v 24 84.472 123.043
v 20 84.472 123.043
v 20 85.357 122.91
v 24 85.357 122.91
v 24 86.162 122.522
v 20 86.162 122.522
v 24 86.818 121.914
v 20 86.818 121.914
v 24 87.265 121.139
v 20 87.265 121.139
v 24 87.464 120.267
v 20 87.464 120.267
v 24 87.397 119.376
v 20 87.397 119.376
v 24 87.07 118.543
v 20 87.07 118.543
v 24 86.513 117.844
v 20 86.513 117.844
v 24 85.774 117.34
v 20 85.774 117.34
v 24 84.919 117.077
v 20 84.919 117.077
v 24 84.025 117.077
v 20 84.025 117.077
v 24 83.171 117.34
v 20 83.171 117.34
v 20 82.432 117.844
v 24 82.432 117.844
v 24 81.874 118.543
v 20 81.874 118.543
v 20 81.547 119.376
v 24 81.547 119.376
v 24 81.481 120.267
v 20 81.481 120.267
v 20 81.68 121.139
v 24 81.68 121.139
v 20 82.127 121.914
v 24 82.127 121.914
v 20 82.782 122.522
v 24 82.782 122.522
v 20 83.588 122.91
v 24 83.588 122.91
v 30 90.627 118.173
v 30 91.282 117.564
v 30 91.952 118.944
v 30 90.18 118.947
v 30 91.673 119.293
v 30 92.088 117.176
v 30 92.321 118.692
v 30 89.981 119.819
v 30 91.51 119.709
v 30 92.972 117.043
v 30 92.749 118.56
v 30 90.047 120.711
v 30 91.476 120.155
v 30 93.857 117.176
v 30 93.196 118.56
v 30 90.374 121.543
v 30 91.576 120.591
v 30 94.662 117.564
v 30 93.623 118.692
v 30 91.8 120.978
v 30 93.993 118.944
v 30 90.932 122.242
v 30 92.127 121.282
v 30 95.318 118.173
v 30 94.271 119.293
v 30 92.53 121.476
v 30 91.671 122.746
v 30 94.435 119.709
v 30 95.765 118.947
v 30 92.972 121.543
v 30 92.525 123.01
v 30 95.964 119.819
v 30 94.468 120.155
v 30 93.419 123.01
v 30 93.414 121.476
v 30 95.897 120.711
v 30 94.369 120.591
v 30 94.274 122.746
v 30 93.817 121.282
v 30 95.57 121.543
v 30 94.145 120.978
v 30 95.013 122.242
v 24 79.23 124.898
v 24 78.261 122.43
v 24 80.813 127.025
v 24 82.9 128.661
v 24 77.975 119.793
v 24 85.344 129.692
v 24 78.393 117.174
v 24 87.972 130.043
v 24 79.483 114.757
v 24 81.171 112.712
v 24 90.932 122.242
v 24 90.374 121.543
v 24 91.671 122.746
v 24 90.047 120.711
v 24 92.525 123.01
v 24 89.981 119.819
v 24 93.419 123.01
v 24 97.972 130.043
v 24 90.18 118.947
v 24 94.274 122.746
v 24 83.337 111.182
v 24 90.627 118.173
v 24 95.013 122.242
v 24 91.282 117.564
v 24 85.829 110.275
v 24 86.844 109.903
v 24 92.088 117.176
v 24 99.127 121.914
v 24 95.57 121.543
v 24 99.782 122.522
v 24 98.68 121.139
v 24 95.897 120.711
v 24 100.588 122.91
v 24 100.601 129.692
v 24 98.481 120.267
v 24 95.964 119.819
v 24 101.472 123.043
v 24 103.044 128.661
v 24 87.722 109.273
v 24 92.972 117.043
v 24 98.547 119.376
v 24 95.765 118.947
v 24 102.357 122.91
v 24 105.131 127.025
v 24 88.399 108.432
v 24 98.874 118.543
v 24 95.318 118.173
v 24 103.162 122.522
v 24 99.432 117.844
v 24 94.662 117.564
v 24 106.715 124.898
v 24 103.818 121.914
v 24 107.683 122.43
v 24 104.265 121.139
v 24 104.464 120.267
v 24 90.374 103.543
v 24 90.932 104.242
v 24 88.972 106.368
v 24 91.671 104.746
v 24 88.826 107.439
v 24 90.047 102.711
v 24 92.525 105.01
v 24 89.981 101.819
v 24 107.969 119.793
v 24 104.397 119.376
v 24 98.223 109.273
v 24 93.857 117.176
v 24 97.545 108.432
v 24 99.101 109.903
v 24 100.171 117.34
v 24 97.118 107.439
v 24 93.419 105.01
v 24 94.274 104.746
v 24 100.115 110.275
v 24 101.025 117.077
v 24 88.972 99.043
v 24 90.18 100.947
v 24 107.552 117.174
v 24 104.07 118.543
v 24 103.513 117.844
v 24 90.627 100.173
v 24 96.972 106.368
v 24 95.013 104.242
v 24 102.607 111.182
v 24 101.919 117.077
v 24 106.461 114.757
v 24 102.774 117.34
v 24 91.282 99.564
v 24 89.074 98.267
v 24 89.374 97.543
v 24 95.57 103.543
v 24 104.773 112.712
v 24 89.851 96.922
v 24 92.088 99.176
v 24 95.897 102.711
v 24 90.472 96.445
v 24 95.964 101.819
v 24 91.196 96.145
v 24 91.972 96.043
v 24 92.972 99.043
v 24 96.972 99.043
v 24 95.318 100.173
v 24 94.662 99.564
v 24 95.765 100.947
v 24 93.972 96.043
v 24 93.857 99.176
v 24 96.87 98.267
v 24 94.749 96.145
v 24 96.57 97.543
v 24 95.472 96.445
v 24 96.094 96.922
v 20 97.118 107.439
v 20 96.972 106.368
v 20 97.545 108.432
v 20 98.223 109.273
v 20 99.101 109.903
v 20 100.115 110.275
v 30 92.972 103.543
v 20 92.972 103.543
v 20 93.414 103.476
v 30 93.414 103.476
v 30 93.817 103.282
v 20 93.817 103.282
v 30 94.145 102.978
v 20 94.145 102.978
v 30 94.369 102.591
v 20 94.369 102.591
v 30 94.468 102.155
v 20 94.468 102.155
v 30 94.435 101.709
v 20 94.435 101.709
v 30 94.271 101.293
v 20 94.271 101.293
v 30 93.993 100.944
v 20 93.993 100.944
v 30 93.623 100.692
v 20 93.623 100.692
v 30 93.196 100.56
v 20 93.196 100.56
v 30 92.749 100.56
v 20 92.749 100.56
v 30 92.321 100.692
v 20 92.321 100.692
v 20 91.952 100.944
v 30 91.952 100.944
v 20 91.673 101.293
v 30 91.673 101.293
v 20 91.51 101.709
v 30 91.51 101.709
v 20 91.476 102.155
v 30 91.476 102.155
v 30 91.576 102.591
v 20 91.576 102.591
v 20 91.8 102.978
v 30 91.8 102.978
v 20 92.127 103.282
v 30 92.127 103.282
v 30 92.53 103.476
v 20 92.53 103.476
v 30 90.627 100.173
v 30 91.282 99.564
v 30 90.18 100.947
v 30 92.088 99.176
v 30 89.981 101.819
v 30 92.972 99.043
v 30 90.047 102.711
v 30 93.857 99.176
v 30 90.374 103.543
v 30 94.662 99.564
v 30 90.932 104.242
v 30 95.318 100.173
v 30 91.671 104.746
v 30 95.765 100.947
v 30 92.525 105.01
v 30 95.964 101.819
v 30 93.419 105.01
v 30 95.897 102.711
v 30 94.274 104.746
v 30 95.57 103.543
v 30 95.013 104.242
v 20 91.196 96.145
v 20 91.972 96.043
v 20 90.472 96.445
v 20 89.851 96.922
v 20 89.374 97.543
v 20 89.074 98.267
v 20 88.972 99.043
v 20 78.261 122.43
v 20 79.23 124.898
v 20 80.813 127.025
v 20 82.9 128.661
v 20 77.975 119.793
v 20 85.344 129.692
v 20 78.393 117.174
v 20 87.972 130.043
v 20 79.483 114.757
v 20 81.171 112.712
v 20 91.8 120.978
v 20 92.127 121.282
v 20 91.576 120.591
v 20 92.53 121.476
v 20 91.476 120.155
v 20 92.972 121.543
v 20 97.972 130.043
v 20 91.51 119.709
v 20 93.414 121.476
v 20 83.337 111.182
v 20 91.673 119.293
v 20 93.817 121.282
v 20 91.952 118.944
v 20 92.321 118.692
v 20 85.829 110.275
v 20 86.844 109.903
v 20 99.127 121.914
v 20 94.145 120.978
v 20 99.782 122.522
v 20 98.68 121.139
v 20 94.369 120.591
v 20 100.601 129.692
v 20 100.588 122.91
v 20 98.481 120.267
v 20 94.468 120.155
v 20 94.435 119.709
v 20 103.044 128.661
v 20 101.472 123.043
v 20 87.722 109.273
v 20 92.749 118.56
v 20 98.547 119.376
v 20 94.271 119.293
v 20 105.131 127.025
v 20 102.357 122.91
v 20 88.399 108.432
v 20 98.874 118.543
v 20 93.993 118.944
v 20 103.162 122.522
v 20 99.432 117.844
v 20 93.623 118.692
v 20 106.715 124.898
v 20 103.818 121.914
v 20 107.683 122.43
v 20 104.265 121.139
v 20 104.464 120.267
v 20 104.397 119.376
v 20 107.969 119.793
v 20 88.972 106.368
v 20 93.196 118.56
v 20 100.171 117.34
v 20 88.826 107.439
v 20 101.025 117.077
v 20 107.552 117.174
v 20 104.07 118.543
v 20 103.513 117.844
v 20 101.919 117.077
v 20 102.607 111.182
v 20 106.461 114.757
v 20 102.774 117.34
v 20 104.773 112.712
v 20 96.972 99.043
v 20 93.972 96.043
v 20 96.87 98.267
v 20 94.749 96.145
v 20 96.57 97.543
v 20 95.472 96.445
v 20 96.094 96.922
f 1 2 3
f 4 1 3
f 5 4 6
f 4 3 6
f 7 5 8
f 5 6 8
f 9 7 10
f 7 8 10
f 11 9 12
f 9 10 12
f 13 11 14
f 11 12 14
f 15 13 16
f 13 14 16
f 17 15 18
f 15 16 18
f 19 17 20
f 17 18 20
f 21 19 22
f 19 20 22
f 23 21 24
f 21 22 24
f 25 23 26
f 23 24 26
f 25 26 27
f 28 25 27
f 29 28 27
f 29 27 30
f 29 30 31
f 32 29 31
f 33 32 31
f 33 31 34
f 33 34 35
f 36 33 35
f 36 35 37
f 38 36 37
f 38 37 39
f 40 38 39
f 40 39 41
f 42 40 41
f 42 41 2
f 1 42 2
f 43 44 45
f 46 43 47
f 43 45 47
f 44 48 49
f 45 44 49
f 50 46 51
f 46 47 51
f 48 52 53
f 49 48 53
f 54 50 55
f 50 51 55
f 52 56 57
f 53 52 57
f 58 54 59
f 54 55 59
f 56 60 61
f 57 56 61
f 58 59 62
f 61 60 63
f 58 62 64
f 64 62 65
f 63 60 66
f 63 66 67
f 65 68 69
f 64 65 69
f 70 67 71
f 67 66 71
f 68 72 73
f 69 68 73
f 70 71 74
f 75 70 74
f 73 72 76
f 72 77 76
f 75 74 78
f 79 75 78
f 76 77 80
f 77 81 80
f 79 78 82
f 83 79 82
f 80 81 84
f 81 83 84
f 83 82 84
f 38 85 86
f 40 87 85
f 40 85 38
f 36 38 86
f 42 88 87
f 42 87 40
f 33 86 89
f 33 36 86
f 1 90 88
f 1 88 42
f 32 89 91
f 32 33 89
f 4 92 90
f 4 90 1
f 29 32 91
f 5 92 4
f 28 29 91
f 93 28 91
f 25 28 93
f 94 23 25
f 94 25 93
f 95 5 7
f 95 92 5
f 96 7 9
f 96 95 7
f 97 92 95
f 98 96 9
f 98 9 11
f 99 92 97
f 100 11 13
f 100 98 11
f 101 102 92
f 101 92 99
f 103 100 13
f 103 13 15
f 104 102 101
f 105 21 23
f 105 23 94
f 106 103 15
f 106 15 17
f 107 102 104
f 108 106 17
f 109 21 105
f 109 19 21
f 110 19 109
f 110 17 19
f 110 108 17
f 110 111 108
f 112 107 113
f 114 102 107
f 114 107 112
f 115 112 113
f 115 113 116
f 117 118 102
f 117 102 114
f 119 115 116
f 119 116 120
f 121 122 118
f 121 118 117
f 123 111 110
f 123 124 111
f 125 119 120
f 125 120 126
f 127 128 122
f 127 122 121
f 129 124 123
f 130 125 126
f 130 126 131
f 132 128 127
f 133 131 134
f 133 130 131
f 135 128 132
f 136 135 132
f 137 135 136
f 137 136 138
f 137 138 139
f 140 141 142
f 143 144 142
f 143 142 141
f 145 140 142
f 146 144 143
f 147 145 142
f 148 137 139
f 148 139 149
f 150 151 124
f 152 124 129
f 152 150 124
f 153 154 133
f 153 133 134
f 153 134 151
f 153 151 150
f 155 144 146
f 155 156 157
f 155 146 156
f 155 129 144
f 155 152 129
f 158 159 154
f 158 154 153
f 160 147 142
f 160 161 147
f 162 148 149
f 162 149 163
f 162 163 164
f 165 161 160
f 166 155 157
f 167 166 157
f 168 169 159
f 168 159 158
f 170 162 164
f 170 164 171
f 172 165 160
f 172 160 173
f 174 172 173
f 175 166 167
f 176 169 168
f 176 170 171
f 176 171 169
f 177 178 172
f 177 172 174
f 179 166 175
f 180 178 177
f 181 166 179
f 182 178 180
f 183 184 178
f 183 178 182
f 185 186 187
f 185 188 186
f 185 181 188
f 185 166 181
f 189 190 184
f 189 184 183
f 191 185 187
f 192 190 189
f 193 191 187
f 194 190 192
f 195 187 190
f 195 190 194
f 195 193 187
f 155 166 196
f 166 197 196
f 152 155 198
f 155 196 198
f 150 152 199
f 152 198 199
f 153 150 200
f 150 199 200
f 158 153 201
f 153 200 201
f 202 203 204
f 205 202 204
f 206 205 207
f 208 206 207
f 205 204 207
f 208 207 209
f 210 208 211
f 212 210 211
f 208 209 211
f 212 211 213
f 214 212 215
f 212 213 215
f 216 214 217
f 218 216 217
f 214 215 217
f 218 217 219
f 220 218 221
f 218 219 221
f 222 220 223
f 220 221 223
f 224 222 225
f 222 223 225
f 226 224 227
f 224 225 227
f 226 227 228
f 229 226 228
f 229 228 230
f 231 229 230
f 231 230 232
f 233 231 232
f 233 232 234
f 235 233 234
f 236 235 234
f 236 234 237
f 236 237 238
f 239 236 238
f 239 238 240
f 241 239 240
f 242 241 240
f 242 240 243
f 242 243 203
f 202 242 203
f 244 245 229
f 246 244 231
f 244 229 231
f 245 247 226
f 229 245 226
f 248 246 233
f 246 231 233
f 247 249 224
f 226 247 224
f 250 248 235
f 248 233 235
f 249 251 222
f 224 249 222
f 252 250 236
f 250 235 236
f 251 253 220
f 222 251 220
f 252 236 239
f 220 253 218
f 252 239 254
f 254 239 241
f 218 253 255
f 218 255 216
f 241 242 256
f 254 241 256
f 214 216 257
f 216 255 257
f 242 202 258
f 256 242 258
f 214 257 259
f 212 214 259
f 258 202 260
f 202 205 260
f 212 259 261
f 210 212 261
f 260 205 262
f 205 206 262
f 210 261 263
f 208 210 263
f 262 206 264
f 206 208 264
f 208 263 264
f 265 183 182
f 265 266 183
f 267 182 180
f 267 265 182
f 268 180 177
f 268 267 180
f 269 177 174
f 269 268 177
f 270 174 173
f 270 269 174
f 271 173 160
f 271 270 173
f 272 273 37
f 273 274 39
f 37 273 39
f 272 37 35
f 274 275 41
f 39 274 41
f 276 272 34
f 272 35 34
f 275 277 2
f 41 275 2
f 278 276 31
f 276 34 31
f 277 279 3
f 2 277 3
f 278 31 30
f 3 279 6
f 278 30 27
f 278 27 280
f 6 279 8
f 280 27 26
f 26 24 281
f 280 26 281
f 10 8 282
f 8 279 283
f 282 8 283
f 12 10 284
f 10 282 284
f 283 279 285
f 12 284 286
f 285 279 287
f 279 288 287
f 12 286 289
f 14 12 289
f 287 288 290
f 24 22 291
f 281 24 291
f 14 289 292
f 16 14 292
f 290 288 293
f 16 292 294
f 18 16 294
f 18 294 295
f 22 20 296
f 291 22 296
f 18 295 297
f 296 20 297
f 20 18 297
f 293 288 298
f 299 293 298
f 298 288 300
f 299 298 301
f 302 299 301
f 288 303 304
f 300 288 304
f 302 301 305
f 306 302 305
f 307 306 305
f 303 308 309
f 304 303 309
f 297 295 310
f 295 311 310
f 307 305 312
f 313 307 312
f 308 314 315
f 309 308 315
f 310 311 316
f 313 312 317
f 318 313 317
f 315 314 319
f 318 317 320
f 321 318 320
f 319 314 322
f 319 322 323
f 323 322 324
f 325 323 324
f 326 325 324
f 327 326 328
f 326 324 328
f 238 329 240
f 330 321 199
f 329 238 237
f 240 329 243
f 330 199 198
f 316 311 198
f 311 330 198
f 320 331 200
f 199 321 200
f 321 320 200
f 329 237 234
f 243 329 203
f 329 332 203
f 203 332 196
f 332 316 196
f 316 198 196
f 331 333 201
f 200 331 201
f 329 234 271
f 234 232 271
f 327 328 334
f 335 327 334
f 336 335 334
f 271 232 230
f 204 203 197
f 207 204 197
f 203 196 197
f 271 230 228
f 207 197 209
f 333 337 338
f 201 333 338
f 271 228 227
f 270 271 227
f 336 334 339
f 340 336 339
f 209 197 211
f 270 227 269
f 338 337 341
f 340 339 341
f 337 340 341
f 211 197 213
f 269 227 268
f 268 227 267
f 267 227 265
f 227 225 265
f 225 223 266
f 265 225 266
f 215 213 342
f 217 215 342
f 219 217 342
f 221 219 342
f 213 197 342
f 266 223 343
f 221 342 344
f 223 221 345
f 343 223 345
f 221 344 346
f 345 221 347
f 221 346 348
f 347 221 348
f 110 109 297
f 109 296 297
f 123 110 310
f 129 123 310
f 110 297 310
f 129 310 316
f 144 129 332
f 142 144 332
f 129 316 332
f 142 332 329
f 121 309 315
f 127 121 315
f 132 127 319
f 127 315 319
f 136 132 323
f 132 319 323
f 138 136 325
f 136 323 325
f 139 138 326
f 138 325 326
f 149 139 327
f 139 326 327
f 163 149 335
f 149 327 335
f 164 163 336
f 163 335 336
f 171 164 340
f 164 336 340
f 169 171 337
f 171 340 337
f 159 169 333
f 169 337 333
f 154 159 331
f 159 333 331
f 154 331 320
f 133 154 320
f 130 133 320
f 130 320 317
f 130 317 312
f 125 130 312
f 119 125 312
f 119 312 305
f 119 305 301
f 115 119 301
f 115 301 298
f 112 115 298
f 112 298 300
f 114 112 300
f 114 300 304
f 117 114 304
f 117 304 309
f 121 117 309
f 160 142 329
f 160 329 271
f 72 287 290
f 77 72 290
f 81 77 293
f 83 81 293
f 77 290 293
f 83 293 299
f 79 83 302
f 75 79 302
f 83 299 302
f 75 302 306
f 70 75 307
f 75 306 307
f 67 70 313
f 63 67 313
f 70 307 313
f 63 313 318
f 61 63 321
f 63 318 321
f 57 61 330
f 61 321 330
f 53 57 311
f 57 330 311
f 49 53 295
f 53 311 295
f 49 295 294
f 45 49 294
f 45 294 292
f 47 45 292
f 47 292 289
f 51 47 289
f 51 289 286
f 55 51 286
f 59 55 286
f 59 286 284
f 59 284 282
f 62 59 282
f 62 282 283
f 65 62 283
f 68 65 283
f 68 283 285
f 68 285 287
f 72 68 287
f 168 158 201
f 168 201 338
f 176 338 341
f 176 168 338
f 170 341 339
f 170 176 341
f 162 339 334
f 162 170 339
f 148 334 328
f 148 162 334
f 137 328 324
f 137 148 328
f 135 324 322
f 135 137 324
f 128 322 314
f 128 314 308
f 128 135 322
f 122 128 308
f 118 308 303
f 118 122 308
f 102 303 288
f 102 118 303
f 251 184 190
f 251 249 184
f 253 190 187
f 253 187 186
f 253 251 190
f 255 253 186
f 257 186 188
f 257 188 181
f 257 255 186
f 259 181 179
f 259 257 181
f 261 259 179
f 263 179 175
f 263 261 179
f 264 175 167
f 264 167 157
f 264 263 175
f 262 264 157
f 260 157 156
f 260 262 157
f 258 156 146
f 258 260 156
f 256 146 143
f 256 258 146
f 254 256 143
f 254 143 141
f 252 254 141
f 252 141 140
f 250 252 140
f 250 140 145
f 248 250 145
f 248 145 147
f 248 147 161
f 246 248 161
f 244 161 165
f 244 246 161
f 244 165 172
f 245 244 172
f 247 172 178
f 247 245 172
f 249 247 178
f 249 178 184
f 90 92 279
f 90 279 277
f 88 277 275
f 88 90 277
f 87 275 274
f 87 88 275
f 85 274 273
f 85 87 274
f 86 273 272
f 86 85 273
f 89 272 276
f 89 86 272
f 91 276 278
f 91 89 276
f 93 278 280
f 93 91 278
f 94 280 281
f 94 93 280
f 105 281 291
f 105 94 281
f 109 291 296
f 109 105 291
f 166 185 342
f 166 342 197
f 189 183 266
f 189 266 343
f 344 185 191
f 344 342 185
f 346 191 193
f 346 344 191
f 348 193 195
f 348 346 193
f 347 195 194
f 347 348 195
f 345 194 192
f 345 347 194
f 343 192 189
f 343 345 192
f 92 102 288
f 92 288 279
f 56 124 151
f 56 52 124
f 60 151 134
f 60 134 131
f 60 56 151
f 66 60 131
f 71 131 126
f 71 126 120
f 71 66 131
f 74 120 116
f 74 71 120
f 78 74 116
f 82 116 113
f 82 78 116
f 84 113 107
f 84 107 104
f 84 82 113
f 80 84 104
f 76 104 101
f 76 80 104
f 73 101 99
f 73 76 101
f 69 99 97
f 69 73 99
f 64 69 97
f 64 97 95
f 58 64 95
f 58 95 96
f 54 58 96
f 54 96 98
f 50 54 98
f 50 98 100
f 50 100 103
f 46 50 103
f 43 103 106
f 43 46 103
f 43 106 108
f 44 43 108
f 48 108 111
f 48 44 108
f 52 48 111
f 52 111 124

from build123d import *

# Parameters (mm, degrees)
BOSS_EXTRUDE1_DEPTH      = 4
SKETCH2_W                = 6
SKETCH2_H                = 3
SKETCH3_W                = 6
SKETCH3_H                = 3
F_3_0_3_DIAMETER_HOLE1_D = 3
F_6_0_6_DIAMETER_HOLE1_D = 6
FILLET1_R                = 3
FILLET2_R                = 4


with BuildPart() as part:
    # Sketch1 → Boss-Extrude1 (new body)
    with BuildSketch(Plane(origin=(24, 0, 0), x_dir=(0, 0, -1), z_dir=(1, 0, 0))):
        with BuildLine():
            Line((-96.043137062, 96.972273827), (-110.093262691, 96.972273827))
            ThreePointArc((-110.093262691, 96.972273827), (-119.542509311, 107.959734558), (-130.043137062, 97.972273827))
            Line((-130.043137062, 97.972273827), (-130.043137062, 87.972273827))
            ThreePointArc((-130.043137062, 87.972273827), (-119.542509311, 77.984813095), (-110.093262691, 88.972273827))
            Line((-110.093262691, 88.972273827), (-96.043137062, 88.972273827))
            Line((-96.043137062, 88.972273827), (-96.043137062, 96.972273827))
        make_face()
    extrude(amount=-BOSS_EXTRUDE1_DEPTH)

    # Sketch2 → Revolve1 (revolve)
    with BuildSketch(Plane.XY.offset(102.043137062), mode=Mode.PRIVATE) as revolve1_sk:
        with Locations((27, 94.472273827)):
            Rectangle(SKETCH2_W, SKETCH2_H)
    revolve(revolve1_sk.sketch.rotate(Axis((24, 92.972273827, 102.043137062), (1, 0, 0)), 270), axis=Axis((24, 92.972273827, 102.043137062), (1, 0, 0)))

    # Sketch3 → Revolve2 (revolve)
    with BuildSketch(Plane.XY.offset(120.043137062), mode=Mode.PRIVATE) as revolve2_sk:
        with Locations((27, 94.472273827)):
            Rectangle(SKETCH3_W, SKETCH3_H)
    revolve(revolve2_sk.sketch.rotate(Axis((24, 92.972273827, 120.043137062), (1, 0, 0)), 270), axis=Axis((24, 92.972273827, 120.043137062), (1, 0, 0)))

    # Ø3.0 (3) Diameter Hole1 (through all)
    with Locations(Plane(origin=(30, 0, 0), x_dir=(0, 0, -1), z_dir=(1, 0, 0))):
        with Locations((-120.043137062, 92.972273827), (-102.043137062, 92.972273827)):
            Hole(F_3_0_3_DIAMETER_HOLE1_D / 2)

    # Ø6.0 (6) Diameter Hole1 (through all)
    with Locations(Plane(origin=(24, 0, 0), x_dir=(0, 0, -1), z_dir=(1, 0, 0))):
        with Locations((-120.043137062, 101.472273827), (-120.043137062, 84.472273827)):
            Hole(F_6_0_6_DIAMETER_HOLE1_D / 2)

    # Fillet1
    fillet1_edges = [part.edges().sort_by_distance(p)[0] for p in [
        (22, 88.972273827, 96.043137062),
        (22, 96.972273827, 96.043137062),
    ]]
    fillet(fillet1_edges, radius=FILLET1_R)

    # Fillet2
    fillet2_edges = [part.edges().sort_by_distance(p)[0] for p in [
        (22, 88.972273827, 110.093262691),
        (22, 96.972273827, 110.093262691),
    ]]
    fillet(fillet2_edges, radius=FILLET2_R)


solid = part.part
